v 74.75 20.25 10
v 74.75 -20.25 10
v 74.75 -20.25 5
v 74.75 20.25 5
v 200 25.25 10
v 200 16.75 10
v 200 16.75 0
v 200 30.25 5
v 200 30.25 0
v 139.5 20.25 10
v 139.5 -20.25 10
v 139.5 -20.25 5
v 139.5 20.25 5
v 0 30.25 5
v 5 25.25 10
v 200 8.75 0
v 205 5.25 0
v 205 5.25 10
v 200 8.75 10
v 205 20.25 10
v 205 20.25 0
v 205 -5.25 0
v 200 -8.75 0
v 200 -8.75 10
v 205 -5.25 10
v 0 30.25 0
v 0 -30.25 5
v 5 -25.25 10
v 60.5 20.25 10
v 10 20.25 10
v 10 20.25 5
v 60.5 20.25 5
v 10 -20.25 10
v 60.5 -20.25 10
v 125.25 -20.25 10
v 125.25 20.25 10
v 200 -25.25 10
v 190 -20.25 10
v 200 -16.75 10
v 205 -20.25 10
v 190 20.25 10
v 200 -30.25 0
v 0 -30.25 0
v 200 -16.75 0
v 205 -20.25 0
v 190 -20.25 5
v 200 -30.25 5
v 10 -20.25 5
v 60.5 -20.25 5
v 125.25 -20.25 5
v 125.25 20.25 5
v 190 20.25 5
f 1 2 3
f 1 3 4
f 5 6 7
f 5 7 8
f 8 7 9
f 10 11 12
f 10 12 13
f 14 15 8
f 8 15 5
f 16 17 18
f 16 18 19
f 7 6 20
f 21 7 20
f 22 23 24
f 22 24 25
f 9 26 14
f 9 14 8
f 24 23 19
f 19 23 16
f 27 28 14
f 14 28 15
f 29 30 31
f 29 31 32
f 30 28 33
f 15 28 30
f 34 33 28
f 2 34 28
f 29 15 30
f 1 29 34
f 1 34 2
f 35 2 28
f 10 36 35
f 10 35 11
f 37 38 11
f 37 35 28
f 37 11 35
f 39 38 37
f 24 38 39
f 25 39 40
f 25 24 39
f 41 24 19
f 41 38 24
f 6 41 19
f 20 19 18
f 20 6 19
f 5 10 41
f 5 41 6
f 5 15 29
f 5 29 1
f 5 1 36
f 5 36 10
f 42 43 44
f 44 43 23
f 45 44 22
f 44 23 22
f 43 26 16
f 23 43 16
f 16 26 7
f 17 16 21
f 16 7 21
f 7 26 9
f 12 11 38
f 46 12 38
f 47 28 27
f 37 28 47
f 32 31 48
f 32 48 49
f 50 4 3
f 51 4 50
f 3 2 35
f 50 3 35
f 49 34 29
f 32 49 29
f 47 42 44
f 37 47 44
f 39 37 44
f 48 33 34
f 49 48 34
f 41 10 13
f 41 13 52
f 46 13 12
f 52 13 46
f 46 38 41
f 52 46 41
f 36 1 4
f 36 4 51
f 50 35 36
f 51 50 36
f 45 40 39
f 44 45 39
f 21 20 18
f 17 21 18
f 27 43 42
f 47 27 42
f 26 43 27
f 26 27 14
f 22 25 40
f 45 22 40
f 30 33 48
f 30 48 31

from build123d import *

# Parameters (mm, degrees)
SKIZZE1_W                       = 200
SKIZZE1_H                       = 60.5
AUFSATZ_LINEAR_AUSTRAGEN1_DEPTH = 10
SKIZZE2_W                       = 50.5
SKIZZE2_H                       = 40.5
SCHNITT_LINEAR_AUSTRAGEN1_DEPTH = 5
FASE1_SIZE                      = 5
AUFSATZ_LINEAR_AUSTRAGEN2_DEPTH = 10


with BuildPart() as part:
    # Skizze1 → Aufsatz-Linear austragen1 (new body)
    with BuildSketch(Plane.XY):
        with Locations((100, 0)):
            Rectangle(SKIZZE1_W, SKIZZE1_H)
    extrude(amount=AUFSATZ_LINEAR_AUSTRAGEN1_DEPTH)

    # Skizze2 → Schnitt-Linear austragen1 (cut)
    with BuildSketch(Plane.XY.offset(10)):
        with Locations((35.25, 0)):
            Rectangle(SKIZZE2_W, SKIZZE2_H)
        with Locations((100, 0)):
            Rectangle(SKIZZE2_W, SKIZZE2_H)
        with Locations((164.75, 0)):
            Rectangle(SKIZZE2_W, SKIZZE2_H)
    extrude(amount=-SCHNITT_LINEAR_AUSTRAGEN1_DEPTH, mode=Mode.SUBTRACT)

    # Fase1
    fase1_edges = [part.edges().sort_by_distance(p)[0] for p in [
        (100, 30.25, 10),
        (0, 0, 10),
        (100, -30.25, 10),
    ]]
    chamfer(fase1_edges, length=FASE1_SIZE)

    # Skizze3 → Aufsatz-Linear austragen2 (add)
    with BuildSketch(Plane.XY.offset(10)):
        Polygon((200, 16.75), (205, 20.25), (205, 5.25), (200, 8.75), align=None)
        Polygon((200, -8.75), (205, -5.25), (205, -20.25), (200, -16.75), align=None)
    extrude(amount=-AUFSATZ_LINEAR_AUSTRAGEN2_DEPTH)


solid = part.part
